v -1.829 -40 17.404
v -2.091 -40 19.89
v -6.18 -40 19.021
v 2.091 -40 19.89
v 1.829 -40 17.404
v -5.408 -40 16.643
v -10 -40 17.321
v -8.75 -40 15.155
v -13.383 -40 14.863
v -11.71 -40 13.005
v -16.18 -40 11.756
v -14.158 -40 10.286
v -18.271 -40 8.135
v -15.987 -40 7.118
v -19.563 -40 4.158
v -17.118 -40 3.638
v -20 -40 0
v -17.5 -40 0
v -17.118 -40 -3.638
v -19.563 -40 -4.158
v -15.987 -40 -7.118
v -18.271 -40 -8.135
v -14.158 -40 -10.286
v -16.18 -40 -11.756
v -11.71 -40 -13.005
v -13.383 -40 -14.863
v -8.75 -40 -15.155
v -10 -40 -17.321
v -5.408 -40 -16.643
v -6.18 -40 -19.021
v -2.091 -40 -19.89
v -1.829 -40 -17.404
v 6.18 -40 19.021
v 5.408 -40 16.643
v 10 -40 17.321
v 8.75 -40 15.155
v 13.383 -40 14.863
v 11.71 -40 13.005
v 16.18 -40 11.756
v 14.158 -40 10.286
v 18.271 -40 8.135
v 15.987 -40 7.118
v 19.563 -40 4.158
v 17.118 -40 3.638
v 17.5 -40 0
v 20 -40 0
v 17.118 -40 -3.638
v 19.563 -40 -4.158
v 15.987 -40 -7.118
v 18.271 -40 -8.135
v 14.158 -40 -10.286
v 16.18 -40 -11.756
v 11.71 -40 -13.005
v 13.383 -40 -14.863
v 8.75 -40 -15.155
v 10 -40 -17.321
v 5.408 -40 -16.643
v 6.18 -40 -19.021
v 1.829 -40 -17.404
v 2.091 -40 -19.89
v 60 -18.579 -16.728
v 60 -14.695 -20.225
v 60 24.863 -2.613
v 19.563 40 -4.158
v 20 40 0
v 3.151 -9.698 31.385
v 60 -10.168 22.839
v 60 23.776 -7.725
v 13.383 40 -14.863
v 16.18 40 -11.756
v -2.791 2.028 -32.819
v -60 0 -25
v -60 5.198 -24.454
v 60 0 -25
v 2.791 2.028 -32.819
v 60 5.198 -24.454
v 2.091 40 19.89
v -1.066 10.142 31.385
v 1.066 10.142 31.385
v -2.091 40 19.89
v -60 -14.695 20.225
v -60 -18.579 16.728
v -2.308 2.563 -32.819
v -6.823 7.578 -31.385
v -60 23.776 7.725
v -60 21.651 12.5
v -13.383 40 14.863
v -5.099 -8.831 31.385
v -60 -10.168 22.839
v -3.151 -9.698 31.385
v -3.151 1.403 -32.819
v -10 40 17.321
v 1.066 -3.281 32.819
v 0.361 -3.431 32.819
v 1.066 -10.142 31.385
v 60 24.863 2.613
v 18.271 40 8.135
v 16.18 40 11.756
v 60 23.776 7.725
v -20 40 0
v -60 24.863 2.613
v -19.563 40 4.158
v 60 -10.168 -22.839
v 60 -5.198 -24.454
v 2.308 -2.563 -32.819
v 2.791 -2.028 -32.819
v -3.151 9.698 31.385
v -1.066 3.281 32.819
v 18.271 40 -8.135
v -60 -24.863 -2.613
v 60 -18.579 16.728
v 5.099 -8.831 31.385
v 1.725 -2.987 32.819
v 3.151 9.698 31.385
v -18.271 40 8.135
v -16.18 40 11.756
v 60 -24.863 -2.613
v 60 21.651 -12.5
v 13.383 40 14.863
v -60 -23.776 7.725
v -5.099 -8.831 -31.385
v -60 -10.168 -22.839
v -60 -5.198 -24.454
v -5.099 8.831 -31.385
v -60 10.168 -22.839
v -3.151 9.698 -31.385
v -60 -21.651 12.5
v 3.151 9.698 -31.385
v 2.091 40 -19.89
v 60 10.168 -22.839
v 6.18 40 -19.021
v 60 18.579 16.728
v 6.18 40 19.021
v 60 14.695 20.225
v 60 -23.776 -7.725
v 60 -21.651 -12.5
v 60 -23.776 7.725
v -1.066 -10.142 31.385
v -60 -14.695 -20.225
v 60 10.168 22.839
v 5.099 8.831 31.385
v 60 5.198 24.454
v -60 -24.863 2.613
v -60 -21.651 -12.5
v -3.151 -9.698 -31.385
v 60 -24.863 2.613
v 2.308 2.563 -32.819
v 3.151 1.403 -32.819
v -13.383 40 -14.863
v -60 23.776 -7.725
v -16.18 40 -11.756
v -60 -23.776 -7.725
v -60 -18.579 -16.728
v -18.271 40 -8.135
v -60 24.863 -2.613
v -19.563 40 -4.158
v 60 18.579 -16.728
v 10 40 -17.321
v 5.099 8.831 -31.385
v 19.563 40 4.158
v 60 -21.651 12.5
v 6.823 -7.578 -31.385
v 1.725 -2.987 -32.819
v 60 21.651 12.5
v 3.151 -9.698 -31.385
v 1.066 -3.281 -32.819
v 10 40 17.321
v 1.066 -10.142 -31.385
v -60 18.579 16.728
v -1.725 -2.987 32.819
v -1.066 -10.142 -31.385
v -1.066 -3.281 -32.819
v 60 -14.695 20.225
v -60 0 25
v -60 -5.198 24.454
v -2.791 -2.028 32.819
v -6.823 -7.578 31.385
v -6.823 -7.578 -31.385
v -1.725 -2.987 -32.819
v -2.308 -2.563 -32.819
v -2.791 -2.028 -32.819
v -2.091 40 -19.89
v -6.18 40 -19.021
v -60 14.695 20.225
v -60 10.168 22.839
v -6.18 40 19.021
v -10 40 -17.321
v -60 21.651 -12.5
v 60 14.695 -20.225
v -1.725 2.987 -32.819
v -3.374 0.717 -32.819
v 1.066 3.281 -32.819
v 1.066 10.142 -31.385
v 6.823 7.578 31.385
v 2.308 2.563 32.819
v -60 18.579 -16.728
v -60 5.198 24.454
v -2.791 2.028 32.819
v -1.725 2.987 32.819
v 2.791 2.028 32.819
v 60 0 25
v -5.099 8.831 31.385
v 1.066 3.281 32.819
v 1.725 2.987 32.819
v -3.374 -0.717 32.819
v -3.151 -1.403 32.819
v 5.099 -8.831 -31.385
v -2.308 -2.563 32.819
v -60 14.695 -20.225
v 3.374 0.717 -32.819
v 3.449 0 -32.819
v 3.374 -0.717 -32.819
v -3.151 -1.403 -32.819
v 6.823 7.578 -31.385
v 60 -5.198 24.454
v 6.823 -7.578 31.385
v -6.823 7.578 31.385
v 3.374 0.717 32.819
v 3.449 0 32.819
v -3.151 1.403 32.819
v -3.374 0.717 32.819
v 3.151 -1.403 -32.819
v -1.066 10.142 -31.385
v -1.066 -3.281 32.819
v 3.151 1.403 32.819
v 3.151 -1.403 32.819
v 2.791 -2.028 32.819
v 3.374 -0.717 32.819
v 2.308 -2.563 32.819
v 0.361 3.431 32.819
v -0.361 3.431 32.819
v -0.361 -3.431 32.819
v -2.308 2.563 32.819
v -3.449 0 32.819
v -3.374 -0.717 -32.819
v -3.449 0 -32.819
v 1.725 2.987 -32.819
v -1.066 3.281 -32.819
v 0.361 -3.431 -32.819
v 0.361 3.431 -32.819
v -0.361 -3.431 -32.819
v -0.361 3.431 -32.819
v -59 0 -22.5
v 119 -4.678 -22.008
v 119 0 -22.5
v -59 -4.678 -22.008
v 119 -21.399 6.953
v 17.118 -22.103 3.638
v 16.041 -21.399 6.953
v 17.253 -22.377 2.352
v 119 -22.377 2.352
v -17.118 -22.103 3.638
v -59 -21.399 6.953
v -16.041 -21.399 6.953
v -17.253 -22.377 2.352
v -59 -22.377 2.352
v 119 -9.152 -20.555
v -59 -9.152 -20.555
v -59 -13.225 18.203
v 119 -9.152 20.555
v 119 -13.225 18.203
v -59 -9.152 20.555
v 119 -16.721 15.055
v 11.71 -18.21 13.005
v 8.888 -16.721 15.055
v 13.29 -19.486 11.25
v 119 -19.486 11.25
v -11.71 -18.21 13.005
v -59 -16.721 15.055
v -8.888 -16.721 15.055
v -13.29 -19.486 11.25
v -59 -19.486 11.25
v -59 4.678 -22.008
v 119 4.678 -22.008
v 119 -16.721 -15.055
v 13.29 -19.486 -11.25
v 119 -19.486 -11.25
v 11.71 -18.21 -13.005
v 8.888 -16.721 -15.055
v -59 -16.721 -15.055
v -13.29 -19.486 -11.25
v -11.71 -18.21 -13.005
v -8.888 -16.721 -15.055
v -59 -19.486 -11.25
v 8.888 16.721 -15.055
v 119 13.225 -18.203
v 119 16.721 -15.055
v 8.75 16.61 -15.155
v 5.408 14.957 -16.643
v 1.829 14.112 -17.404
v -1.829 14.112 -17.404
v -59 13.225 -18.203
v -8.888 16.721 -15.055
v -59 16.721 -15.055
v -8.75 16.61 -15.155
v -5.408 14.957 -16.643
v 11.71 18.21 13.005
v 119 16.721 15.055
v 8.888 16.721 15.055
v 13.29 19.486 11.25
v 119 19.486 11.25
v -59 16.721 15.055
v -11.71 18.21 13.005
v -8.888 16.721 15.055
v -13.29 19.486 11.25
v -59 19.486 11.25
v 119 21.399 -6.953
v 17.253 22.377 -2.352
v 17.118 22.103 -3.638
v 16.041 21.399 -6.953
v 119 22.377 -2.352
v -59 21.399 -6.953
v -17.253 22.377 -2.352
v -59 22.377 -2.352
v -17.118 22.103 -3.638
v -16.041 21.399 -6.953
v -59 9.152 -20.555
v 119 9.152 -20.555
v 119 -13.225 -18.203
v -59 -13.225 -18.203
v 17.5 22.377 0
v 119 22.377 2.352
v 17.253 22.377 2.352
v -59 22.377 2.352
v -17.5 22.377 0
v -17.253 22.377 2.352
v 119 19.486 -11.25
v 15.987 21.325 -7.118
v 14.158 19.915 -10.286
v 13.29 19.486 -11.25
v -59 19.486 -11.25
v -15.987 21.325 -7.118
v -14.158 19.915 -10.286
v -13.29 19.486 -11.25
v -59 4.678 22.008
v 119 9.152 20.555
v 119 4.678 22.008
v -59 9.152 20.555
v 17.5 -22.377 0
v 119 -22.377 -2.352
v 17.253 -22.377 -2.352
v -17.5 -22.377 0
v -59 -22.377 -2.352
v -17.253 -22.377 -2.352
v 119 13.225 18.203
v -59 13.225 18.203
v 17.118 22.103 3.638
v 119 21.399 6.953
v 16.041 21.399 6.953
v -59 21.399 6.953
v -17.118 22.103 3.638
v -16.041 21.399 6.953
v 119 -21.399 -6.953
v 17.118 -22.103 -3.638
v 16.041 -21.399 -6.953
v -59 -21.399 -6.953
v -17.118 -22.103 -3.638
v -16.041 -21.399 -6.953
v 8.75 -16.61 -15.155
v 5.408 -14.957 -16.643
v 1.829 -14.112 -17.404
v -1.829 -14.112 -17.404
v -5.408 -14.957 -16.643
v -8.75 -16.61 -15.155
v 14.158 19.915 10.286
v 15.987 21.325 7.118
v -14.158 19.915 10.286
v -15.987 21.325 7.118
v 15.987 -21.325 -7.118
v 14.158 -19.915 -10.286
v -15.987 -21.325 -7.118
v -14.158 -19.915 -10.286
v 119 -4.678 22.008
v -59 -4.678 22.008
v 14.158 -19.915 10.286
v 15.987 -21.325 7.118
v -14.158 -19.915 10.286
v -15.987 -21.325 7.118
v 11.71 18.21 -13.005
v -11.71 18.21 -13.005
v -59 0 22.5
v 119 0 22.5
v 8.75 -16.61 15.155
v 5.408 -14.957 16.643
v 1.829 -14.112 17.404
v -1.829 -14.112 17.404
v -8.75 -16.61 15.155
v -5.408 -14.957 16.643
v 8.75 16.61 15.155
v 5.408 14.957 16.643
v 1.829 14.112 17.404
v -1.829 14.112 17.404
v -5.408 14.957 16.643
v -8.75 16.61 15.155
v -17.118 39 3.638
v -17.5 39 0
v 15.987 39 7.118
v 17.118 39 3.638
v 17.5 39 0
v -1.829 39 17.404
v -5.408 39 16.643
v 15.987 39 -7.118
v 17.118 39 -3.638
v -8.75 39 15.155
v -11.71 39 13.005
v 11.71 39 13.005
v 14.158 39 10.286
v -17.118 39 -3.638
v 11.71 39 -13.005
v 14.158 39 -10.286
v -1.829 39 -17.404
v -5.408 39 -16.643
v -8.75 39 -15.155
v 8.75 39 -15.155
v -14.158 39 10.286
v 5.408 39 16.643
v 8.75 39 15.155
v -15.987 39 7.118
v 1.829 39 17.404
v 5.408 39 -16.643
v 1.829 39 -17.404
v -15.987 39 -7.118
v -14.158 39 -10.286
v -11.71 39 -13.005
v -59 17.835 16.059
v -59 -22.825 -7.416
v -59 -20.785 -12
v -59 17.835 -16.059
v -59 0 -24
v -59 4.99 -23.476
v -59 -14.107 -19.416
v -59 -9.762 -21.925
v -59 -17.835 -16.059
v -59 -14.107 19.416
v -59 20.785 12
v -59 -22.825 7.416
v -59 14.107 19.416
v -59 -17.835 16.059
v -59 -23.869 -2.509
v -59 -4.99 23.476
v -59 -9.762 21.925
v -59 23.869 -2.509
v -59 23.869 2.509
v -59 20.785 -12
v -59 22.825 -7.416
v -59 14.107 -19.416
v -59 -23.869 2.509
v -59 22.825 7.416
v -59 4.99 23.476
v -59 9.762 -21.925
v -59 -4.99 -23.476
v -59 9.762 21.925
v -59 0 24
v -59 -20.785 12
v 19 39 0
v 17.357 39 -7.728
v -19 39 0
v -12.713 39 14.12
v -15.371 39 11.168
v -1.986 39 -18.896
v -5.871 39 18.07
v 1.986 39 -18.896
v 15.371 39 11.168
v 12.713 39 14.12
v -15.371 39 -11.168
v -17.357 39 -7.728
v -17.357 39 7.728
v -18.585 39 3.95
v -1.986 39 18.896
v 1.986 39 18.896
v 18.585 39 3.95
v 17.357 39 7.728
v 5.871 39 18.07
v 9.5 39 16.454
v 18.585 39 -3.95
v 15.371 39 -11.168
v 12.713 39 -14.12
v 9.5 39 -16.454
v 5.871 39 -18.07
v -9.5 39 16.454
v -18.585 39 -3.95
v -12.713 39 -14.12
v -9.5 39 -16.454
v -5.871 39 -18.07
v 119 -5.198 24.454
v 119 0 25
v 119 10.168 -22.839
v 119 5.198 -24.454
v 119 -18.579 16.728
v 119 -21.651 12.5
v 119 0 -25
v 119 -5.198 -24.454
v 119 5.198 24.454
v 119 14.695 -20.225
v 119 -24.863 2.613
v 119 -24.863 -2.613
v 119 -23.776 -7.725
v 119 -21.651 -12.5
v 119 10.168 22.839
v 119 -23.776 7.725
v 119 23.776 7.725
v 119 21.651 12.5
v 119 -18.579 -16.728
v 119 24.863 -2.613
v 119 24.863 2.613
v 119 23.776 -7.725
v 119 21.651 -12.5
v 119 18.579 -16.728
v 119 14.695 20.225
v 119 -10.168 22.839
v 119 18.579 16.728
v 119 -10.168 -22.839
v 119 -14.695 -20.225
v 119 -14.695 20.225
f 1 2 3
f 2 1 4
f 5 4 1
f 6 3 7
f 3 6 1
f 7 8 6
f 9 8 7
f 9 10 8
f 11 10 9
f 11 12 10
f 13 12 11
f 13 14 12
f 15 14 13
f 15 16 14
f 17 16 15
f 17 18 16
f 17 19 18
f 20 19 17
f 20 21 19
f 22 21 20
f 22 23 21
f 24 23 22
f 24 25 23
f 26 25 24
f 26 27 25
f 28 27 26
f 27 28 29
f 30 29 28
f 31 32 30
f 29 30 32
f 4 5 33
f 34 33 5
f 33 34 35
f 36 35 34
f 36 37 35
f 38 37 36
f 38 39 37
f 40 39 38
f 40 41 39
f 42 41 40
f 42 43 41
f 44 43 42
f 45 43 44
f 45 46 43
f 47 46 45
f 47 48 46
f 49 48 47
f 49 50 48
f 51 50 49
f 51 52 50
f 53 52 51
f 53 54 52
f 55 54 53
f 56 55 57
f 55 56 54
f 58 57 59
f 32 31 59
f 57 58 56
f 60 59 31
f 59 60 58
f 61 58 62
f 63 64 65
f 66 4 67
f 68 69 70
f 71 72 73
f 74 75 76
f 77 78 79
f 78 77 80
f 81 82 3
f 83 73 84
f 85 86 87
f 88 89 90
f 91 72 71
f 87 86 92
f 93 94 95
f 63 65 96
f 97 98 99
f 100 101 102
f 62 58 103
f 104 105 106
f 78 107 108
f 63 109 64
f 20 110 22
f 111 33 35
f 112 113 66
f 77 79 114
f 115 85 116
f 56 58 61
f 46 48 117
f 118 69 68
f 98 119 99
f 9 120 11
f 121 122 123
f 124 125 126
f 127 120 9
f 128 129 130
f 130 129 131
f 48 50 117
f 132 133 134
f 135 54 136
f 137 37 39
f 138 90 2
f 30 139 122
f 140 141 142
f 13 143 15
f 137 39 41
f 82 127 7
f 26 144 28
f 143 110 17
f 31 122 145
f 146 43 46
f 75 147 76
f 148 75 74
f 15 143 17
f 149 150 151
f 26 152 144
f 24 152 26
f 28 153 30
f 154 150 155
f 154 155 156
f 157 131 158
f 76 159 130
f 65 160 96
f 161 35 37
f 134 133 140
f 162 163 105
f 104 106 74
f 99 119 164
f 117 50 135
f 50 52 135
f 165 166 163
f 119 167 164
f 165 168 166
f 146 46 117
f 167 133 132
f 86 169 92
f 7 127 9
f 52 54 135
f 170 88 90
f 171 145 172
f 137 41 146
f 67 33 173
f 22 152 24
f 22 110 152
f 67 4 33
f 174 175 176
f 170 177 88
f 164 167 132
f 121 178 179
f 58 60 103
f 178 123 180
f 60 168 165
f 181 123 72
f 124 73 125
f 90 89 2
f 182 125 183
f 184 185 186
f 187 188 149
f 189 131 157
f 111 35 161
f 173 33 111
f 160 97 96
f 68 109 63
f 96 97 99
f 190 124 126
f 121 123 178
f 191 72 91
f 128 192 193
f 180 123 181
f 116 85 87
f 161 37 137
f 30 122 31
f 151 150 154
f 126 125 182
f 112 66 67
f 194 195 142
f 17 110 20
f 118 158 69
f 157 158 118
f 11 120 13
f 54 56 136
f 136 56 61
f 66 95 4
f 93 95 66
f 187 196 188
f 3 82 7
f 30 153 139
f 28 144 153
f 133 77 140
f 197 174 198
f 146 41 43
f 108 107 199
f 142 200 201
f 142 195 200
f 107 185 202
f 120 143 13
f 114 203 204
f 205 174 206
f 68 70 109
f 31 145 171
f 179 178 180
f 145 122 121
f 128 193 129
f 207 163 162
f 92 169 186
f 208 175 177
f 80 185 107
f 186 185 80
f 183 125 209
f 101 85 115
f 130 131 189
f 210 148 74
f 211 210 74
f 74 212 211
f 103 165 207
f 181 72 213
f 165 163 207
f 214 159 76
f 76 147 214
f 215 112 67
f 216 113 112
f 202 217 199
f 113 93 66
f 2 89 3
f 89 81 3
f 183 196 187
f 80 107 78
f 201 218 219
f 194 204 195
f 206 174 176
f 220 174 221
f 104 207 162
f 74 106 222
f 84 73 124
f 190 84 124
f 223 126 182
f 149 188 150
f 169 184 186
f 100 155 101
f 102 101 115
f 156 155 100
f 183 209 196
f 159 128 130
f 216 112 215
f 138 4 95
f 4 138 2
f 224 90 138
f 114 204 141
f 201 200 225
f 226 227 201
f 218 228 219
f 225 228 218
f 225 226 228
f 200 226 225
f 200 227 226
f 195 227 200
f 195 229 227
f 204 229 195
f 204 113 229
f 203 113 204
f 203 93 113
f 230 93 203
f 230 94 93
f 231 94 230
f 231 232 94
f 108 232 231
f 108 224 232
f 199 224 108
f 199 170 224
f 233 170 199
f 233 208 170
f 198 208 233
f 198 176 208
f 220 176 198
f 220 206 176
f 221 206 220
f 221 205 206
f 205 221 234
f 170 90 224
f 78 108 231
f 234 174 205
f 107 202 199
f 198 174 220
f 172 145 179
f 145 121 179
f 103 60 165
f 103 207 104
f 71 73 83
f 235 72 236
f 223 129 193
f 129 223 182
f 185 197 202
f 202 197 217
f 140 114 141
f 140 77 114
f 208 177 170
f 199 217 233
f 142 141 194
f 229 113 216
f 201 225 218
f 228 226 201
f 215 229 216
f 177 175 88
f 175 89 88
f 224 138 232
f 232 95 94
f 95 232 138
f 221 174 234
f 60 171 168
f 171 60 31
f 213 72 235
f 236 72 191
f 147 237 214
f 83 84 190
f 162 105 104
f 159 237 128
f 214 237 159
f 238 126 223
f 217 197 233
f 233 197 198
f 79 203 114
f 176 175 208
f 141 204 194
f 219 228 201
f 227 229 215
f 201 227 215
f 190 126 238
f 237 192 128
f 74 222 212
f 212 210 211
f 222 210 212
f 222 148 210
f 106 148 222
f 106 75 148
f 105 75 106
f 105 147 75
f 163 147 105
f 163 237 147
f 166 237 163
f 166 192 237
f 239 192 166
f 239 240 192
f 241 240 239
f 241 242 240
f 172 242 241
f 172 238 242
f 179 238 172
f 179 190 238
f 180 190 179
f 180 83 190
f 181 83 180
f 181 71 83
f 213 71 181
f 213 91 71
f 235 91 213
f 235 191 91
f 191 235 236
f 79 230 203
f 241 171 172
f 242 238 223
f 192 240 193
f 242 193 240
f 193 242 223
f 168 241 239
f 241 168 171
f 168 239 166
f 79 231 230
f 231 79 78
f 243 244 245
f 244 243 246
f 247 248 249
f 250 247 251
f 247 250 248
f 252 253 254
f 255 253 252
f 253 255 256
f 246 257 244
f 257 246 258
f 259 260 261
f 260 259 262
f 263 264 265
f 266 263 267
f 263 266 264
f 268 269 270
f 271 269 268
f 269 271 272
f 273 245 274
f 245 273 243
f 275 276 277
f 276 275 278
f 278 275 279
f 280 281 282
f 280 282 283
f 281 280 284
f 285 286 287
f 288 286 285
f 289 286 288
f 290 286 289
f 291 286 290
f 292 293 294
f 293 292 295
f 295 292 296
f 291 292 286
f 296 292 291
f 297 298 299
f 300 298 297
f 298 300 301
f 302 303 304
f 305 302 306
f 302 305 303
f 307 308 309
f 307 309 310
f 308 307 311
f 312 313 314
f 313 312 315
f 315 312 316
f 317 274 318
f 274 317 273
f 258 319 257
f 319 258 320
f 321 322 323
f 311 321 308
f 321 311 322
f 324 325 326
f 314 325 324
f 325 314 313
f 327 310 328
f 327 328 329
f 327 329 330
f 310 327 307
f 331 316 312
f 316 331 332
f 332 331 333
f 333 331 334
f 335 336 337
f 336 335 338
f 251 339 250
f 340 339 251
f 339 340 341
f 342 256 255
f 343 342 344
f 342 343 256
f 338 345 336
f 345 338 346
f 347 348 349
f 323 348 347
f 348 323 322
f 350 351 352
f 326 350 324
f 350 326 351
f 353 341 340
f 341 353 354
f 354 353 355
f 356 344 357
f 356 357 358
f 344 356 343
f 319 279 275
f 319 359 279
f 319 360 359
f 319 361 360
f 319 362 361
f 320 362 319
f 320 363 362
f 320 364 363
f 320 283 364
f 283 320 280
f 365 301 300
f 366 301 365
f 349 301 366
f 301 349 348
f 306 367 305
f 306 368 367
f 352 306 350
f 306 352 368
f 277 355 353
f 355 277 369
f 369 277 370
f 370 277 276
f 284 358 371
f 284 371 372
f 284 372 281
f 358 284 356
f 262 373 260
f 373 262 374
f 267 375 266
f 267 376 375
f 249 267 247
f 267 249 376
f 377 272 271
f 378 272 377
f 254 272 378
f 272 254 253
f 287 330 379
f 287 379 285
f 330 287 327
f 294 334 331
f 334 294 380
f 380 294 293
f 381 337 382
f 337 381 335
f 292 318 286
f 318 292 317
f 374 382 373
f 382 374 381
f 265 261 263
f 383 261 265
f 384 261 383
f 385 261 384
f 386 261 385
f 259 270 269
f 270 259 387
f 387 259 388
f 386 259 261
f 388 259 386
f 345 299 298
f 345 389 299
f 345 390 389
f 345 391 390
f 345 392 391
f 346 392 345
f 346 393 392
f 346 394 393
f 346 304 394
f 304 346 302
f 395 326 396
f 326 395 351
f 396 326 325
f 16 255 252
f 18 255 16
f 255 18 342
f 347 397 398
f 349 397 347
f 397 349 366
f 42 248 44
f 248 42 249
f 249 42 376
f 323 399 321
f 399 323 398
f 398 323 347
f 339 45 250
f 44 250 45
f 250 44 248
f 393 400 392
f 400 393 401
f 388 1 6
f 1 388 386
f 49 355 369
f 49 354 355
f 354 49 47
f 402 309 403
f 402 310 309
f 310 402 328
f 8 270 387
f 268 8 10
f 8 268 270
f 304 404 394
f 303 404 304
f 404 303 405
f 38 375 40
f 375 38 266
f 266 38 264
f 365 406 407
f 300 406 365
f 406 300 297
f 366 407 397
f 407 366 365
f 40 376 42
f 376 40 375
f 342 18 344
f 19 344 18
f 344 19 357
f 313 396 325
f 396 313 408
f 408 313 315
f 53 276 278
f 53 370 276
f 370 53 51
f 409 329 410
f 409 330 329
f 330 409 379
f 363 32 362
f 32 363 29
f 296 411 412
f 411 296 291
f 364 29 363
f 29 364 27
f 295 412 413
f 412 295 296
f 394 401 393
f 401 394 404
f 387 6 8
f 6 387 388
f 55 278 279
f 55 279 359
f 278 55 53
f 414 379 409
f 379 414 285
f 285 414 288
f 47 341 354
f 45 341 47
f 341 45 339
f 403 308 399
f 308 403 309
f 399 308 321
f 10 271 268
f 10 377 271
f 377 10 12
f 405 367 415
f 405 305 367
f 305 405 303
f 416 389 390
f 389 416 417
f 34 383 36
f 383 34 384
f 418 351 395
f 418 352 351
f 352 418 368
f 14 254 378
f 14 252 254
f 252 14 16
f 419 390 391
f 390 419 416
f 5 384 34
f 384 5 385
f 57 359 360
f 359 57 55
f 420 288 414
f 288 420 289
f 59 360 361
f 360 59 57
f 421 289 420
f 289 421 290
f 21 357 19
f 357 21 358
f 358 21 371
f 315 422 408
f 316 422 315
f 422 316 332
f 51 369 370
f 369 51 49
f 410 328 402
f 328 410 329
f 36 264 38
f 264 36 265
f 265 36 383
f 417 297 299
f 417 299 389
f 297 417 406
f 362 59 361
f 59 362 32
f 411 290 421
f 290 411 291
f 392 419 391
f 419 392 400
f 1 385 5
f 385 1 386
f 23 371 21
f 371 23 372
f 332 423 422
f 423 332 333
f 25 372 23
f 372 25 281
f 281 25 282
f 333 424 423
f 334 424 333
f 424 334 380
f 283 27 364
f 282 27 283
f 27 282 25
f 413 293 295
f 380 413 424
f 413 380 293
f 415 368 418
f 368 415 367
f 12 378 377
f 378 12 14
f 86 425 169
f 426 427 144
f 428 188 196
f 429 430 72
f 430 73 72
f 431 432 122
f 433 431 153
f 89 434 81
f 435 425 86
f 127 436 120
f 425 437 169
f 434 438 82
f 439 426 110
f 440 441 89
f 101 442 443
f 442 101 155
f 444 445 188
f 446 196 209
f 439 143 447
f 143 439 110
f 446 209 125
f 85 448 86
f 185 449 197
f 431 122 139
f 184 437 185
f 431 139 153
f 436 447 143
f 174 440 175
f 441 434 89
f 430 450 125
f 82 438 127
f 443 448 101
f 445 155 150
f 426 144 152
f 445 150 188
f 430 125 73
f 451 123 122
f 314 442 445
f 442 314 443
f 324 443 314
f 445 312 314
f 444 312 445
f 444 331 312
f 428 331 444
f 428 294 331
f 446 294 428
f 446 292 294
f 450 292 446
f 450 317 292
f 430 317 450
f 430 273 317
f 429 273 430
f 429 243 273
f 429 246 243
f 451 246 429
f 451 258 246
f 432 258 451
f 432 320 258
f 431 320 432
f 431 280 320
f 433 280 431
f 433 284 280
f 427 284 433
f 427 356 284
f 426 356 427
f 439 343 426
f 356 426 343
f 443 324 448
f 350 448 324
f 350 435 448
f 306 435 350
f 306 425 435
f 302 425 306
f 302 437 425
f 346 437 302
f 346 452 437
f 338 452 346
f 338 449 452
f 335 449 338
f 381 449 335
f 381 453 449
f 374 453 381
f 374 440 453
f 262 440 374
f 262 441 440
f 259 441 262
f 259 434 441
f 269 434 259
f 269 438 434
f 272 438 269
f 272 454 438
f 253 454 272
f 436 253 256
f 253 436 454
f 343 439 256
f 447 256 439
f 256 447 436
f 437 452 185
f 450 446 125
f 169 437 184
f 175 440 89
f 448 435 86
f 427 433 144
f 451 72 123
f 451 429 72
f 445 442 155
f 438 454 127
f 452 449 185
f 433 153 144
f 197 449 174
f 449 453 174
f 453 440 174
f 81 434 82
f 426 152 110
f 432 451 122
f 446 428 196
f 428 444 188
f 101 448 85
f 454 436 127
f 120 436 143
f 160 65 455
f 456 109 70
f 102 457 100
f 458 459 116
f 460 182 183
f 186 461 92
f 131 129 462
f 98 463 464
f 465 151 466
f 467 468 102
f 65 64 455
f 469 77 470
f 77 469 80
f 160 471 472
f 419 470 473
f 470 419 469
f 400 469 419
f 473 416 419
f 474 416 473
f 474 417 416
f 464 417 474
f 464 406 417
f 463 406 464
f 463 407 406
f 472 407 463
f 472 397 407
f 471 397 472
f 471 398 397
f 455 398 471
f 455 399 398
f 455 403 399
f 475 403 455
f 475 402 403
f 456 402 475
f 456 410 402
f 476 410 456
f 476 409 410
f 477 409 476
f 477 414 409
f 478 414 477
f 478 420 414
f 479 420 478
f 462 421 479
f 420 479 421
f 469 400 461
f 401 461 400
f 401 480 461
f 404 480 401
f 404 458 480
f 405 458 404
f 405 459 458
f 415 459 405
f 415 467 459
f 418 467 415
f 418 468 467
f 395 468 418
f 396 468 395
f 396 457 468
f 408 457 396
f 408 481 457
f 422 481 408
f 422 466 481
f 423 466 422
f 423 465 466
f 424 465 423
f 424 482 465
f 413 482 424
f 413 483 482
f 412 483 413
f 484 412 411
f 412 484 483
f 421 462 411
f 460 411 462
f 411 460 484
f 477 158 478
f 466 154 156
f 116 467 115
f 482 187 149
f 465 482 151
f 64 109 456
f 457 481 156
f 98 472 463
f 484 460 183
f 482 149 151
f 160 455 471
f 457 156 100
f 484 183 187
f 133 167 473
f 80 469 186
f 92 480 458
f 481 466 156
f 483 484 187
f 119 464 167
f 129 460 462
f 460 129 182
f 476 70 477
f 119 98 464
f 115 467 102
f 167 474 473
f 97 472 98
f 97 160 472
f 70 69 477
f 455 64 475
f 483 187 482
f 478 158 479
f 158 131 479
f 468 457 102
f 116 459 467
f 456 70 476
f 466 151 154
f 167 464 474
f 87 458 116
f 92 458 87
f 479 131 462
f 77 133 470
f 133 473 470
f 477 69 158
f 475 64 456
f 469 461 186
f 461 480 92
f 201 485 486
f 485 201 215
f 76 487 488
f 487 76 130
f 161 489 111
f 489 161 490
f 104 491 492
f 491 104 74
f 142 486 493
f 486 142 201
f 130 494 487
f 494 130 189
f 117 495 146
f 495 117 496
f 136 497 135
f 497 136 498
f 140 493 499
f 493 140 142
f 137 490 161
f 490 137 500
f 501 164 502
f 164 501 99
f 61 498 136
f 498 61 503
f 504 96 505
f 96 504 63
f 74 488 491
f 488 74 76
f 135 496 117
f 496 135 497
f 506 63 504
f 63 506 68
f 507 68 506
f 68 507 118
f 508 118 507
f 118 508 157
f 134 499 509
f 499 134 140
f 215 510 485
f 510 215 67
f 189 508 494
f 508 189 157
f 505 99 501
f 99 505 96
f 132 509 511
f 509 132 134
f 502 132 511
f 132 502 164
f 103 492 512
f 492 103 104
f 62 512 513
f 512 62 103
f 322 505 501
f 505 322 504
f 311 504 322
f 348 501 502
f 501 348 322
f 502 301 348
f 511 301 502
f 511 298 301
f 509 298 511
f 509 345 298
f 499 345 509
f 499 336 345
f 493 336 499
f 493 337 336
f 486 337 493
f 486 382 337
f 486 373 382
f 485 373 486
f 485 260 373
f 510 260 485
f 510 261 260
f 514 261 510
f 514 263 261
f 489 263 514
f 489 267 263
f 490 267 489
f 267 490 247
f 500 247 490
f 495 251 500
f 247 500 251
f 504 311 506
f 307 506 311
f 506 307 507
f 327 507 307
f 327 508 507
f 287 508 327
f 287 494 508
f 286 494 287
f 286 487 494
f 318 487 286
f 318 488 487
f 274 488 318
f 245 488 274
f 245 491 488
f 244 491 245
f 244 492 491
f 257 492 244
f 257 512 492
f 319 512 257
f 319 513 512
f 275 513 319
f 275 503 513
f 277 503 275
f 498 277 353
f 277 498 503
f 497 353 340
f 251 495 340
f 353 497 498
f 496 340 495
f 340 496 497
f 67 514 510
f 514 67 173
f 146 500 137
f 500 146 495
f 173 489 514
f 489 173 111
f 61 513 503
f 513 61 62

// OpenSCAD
// Parameters
main_nominal_diameter_mm = 50; //[25:100:1]
branch_nominal_diameter_mm = 40; //[20:80:1]
main_axis_length_mm = 120; //[60:240:1]
branch_axis_length_mm = 80; //[40:160:1]
wall_thickness_mm = 2.5; //[1.25:5:0.1]
socket_insertion_depth_main_mm = 35; //[18:70:1]
socket_insertion_depth_branch_mm = 30; //[15:60:1]
junction_radius_mm = 8; //[4:16:0.5]
end_chamfer_mm = 1; //[0.5:3:0.1]
overlap_mm = 1; //[0.5:2:0.1]
stop_thickness_mm = 2; //[1:4:0.1]
stop_radial_mm = 1.5; //[0.8:3:0.1]
ht_pipe_length_mm = 60; //[30:150:1]

// HT Pipe - complete geometry
module ht_pipe() {
  color([0.85, 0.85, 0.8]) {
    difference() {
      // Outer pipe
      translate([main_axis_length_mm/2 + ht_pipe_length_mm/2 - overlap_mm, 0, 0])
        rotate([0, 90, 0])
        cylinder(r=main_nominal_diameter_mm/2, h=ht_pipe_length_mm, center=true);
      // Inner bore
      translate([main_axis_length_mm/2 + ht_pipe_length_mm/2 - overlap_mm, 0, 0])
        rotate([0, 90, 0])
        cylinder(r=main_nominal_diameter_mm/2 - wall_thickness_mm, h=ht_pipe_length_mm + 2*overlap_mm, center=true);
    }
  }
}

// Assembly
module assembly() {
  color([0.85, 0.85, 0.8]) {
    difference() {
      union() {
        // Main run socket
        translate([0, 0, 0])
          rotate([0, 90, 0])
          cylinder(r=main_nominal_diameter_mm/2, h=main_axis_length_mm, center=true);
        // Branch socket
        translate([0, 0, 0])
          rotate([90, 0, 0])
          cylinder(r=branch_nominal_diameter_mm/2, h=branch_axis_length_mm, center=true);
        // Junction blend
        hull() {
          sphere(r=max(main_nominal_diameter_mm, branch_nominal_diameter_mm)/2 + junction_radius_mm, center=true);
          translate([0, 0, 0])
            rotate([0, 90, 0])
            cylinder(r=main_nominal_diameter_mm/2, h=main_axis_length_mm, center=true);
          translate([0, 0, 0])
            rotate([90, 0, 0])
            cylinder(r=branch_nominal_diameter_mm/2, h=branch_axis_length_mm, center=true);
        }
        // Socket stops
        difference() {
          translate([-(main_axis_length_mm/2 - socket_insertion_depth_main_mm + stop_thickness_mm/2), 0, 0])
            rotate([0, 90, 0])
            cylinder(r=main_nominal_diameter_mm/2 - wall_thickness_mm, h=stop_thickness_mm, center=true);
          translate([-(main_axis_length_mm/2 - socket_insertion_depth_main_mm + stop_thickness_mm/2), 0, 0])
            rotate([0, 90, 0])
            cylinder(r=main_nominal_diameter_mm/2 - wall_thickness_mm - stop_radial_mm, h=stop_thickness_mm + 2*overlap_mm, center=true);
        }
        difference() {
          translate([(main_axis_length_mm/2 - socket_insertion_depth_main_mm + stop_thickness_mm/2), 0, 0])
            rotate([0, 90, 0])
            cylinder(r=main_nominal_diameter_mm/2 - wall_thickness_mm, h=stop_thickness_mm, center=true);
          translate([(main_axis_length_mm/2 - socket_insertion_depth_main_mm + stop_thickness_mm/2), 0, 0])
            rotate([0, 90, 0])
            cylinder(r=main_nominal_diameter_mm/2 - wall_thickness_mm - stop_radial_mm, h=stop_thickness_mm + 2*overlap_mm, center=true);
        }
        difference() {
          translate([0, (branch_axis_length_mm/2 - socket_insertion_depth_branch_mm + stop_thickness_mm/2), 0])
            rotate([90, 0, 0])
            cylinder(r=branch_nominal_diameter_mm/2 - wall_thickness_mm, h=stop_thickness_mm, center=true);
          translate([0, (branch_axis_length_mm/2 - socket_insertion_depth_branch_mm + stop_thickness_mm/2), 0])
            rotate([90, 0, 0])
            cylinder(r=branch_nominal_diameter_mm/2 - wall_thickness_mm - stop_radial_mm, h=stop_thickness_mm + 2*overlap_mm, center=true);
        }
      }
      // Internal flow bore
      union() {
        translate([0, 0, 0])
          rotate([0, 90, 0])
          cylinder(r=main_nominal_diameter_mm/2 - wall_thickness_mm, h=main_axis_length_mm + 2*overlap_mm, center=true);
        translate([0, 0, 0])
          rotate([90, 0, 0])
          cylinder(r=branch_nominal_diameter_mm/2 - wall_thickness_mm, h=branch_axis_length_mm + 2*overlap_mm, center=true);
      }
      // End chamfers
      translate([-(main_axis_length_mm/2 - end_chamfer_mm/2), 0, 0])
        rotate([0, 90, 0])
        cylinder(r1=main_nominal_diameter_mm/2, r2=main_nominal_diameter_mm/2 - end_chamfer_mm, h=end_chamfer_mm, center=true);
      translate([(main_axis_length_mm/2 - end_chamfer_mm/2), 0, 0])
        rotate([0, -90, 0])
        cylinder(r1=main_nominal_diameter_mm/2, r2=main_nominal_diameter_mm/2 - end_chamfer_mm, h=end_chamfer_mm, center=true);
      translate([0, (branch_axis_length_mm/2 - end_chamfer_mm/2), 0])
        rotate([90, 0, 0])
        cylinder(r1=branch_nominal_diameter_mm/2, r2=branch_nominal_diameter_mm/2 - end_chamfer_mm, h=end_chamfer_mm, center=true);
    }
  }
  // HT Pipe
  ht_pipe();
}

assembly();
